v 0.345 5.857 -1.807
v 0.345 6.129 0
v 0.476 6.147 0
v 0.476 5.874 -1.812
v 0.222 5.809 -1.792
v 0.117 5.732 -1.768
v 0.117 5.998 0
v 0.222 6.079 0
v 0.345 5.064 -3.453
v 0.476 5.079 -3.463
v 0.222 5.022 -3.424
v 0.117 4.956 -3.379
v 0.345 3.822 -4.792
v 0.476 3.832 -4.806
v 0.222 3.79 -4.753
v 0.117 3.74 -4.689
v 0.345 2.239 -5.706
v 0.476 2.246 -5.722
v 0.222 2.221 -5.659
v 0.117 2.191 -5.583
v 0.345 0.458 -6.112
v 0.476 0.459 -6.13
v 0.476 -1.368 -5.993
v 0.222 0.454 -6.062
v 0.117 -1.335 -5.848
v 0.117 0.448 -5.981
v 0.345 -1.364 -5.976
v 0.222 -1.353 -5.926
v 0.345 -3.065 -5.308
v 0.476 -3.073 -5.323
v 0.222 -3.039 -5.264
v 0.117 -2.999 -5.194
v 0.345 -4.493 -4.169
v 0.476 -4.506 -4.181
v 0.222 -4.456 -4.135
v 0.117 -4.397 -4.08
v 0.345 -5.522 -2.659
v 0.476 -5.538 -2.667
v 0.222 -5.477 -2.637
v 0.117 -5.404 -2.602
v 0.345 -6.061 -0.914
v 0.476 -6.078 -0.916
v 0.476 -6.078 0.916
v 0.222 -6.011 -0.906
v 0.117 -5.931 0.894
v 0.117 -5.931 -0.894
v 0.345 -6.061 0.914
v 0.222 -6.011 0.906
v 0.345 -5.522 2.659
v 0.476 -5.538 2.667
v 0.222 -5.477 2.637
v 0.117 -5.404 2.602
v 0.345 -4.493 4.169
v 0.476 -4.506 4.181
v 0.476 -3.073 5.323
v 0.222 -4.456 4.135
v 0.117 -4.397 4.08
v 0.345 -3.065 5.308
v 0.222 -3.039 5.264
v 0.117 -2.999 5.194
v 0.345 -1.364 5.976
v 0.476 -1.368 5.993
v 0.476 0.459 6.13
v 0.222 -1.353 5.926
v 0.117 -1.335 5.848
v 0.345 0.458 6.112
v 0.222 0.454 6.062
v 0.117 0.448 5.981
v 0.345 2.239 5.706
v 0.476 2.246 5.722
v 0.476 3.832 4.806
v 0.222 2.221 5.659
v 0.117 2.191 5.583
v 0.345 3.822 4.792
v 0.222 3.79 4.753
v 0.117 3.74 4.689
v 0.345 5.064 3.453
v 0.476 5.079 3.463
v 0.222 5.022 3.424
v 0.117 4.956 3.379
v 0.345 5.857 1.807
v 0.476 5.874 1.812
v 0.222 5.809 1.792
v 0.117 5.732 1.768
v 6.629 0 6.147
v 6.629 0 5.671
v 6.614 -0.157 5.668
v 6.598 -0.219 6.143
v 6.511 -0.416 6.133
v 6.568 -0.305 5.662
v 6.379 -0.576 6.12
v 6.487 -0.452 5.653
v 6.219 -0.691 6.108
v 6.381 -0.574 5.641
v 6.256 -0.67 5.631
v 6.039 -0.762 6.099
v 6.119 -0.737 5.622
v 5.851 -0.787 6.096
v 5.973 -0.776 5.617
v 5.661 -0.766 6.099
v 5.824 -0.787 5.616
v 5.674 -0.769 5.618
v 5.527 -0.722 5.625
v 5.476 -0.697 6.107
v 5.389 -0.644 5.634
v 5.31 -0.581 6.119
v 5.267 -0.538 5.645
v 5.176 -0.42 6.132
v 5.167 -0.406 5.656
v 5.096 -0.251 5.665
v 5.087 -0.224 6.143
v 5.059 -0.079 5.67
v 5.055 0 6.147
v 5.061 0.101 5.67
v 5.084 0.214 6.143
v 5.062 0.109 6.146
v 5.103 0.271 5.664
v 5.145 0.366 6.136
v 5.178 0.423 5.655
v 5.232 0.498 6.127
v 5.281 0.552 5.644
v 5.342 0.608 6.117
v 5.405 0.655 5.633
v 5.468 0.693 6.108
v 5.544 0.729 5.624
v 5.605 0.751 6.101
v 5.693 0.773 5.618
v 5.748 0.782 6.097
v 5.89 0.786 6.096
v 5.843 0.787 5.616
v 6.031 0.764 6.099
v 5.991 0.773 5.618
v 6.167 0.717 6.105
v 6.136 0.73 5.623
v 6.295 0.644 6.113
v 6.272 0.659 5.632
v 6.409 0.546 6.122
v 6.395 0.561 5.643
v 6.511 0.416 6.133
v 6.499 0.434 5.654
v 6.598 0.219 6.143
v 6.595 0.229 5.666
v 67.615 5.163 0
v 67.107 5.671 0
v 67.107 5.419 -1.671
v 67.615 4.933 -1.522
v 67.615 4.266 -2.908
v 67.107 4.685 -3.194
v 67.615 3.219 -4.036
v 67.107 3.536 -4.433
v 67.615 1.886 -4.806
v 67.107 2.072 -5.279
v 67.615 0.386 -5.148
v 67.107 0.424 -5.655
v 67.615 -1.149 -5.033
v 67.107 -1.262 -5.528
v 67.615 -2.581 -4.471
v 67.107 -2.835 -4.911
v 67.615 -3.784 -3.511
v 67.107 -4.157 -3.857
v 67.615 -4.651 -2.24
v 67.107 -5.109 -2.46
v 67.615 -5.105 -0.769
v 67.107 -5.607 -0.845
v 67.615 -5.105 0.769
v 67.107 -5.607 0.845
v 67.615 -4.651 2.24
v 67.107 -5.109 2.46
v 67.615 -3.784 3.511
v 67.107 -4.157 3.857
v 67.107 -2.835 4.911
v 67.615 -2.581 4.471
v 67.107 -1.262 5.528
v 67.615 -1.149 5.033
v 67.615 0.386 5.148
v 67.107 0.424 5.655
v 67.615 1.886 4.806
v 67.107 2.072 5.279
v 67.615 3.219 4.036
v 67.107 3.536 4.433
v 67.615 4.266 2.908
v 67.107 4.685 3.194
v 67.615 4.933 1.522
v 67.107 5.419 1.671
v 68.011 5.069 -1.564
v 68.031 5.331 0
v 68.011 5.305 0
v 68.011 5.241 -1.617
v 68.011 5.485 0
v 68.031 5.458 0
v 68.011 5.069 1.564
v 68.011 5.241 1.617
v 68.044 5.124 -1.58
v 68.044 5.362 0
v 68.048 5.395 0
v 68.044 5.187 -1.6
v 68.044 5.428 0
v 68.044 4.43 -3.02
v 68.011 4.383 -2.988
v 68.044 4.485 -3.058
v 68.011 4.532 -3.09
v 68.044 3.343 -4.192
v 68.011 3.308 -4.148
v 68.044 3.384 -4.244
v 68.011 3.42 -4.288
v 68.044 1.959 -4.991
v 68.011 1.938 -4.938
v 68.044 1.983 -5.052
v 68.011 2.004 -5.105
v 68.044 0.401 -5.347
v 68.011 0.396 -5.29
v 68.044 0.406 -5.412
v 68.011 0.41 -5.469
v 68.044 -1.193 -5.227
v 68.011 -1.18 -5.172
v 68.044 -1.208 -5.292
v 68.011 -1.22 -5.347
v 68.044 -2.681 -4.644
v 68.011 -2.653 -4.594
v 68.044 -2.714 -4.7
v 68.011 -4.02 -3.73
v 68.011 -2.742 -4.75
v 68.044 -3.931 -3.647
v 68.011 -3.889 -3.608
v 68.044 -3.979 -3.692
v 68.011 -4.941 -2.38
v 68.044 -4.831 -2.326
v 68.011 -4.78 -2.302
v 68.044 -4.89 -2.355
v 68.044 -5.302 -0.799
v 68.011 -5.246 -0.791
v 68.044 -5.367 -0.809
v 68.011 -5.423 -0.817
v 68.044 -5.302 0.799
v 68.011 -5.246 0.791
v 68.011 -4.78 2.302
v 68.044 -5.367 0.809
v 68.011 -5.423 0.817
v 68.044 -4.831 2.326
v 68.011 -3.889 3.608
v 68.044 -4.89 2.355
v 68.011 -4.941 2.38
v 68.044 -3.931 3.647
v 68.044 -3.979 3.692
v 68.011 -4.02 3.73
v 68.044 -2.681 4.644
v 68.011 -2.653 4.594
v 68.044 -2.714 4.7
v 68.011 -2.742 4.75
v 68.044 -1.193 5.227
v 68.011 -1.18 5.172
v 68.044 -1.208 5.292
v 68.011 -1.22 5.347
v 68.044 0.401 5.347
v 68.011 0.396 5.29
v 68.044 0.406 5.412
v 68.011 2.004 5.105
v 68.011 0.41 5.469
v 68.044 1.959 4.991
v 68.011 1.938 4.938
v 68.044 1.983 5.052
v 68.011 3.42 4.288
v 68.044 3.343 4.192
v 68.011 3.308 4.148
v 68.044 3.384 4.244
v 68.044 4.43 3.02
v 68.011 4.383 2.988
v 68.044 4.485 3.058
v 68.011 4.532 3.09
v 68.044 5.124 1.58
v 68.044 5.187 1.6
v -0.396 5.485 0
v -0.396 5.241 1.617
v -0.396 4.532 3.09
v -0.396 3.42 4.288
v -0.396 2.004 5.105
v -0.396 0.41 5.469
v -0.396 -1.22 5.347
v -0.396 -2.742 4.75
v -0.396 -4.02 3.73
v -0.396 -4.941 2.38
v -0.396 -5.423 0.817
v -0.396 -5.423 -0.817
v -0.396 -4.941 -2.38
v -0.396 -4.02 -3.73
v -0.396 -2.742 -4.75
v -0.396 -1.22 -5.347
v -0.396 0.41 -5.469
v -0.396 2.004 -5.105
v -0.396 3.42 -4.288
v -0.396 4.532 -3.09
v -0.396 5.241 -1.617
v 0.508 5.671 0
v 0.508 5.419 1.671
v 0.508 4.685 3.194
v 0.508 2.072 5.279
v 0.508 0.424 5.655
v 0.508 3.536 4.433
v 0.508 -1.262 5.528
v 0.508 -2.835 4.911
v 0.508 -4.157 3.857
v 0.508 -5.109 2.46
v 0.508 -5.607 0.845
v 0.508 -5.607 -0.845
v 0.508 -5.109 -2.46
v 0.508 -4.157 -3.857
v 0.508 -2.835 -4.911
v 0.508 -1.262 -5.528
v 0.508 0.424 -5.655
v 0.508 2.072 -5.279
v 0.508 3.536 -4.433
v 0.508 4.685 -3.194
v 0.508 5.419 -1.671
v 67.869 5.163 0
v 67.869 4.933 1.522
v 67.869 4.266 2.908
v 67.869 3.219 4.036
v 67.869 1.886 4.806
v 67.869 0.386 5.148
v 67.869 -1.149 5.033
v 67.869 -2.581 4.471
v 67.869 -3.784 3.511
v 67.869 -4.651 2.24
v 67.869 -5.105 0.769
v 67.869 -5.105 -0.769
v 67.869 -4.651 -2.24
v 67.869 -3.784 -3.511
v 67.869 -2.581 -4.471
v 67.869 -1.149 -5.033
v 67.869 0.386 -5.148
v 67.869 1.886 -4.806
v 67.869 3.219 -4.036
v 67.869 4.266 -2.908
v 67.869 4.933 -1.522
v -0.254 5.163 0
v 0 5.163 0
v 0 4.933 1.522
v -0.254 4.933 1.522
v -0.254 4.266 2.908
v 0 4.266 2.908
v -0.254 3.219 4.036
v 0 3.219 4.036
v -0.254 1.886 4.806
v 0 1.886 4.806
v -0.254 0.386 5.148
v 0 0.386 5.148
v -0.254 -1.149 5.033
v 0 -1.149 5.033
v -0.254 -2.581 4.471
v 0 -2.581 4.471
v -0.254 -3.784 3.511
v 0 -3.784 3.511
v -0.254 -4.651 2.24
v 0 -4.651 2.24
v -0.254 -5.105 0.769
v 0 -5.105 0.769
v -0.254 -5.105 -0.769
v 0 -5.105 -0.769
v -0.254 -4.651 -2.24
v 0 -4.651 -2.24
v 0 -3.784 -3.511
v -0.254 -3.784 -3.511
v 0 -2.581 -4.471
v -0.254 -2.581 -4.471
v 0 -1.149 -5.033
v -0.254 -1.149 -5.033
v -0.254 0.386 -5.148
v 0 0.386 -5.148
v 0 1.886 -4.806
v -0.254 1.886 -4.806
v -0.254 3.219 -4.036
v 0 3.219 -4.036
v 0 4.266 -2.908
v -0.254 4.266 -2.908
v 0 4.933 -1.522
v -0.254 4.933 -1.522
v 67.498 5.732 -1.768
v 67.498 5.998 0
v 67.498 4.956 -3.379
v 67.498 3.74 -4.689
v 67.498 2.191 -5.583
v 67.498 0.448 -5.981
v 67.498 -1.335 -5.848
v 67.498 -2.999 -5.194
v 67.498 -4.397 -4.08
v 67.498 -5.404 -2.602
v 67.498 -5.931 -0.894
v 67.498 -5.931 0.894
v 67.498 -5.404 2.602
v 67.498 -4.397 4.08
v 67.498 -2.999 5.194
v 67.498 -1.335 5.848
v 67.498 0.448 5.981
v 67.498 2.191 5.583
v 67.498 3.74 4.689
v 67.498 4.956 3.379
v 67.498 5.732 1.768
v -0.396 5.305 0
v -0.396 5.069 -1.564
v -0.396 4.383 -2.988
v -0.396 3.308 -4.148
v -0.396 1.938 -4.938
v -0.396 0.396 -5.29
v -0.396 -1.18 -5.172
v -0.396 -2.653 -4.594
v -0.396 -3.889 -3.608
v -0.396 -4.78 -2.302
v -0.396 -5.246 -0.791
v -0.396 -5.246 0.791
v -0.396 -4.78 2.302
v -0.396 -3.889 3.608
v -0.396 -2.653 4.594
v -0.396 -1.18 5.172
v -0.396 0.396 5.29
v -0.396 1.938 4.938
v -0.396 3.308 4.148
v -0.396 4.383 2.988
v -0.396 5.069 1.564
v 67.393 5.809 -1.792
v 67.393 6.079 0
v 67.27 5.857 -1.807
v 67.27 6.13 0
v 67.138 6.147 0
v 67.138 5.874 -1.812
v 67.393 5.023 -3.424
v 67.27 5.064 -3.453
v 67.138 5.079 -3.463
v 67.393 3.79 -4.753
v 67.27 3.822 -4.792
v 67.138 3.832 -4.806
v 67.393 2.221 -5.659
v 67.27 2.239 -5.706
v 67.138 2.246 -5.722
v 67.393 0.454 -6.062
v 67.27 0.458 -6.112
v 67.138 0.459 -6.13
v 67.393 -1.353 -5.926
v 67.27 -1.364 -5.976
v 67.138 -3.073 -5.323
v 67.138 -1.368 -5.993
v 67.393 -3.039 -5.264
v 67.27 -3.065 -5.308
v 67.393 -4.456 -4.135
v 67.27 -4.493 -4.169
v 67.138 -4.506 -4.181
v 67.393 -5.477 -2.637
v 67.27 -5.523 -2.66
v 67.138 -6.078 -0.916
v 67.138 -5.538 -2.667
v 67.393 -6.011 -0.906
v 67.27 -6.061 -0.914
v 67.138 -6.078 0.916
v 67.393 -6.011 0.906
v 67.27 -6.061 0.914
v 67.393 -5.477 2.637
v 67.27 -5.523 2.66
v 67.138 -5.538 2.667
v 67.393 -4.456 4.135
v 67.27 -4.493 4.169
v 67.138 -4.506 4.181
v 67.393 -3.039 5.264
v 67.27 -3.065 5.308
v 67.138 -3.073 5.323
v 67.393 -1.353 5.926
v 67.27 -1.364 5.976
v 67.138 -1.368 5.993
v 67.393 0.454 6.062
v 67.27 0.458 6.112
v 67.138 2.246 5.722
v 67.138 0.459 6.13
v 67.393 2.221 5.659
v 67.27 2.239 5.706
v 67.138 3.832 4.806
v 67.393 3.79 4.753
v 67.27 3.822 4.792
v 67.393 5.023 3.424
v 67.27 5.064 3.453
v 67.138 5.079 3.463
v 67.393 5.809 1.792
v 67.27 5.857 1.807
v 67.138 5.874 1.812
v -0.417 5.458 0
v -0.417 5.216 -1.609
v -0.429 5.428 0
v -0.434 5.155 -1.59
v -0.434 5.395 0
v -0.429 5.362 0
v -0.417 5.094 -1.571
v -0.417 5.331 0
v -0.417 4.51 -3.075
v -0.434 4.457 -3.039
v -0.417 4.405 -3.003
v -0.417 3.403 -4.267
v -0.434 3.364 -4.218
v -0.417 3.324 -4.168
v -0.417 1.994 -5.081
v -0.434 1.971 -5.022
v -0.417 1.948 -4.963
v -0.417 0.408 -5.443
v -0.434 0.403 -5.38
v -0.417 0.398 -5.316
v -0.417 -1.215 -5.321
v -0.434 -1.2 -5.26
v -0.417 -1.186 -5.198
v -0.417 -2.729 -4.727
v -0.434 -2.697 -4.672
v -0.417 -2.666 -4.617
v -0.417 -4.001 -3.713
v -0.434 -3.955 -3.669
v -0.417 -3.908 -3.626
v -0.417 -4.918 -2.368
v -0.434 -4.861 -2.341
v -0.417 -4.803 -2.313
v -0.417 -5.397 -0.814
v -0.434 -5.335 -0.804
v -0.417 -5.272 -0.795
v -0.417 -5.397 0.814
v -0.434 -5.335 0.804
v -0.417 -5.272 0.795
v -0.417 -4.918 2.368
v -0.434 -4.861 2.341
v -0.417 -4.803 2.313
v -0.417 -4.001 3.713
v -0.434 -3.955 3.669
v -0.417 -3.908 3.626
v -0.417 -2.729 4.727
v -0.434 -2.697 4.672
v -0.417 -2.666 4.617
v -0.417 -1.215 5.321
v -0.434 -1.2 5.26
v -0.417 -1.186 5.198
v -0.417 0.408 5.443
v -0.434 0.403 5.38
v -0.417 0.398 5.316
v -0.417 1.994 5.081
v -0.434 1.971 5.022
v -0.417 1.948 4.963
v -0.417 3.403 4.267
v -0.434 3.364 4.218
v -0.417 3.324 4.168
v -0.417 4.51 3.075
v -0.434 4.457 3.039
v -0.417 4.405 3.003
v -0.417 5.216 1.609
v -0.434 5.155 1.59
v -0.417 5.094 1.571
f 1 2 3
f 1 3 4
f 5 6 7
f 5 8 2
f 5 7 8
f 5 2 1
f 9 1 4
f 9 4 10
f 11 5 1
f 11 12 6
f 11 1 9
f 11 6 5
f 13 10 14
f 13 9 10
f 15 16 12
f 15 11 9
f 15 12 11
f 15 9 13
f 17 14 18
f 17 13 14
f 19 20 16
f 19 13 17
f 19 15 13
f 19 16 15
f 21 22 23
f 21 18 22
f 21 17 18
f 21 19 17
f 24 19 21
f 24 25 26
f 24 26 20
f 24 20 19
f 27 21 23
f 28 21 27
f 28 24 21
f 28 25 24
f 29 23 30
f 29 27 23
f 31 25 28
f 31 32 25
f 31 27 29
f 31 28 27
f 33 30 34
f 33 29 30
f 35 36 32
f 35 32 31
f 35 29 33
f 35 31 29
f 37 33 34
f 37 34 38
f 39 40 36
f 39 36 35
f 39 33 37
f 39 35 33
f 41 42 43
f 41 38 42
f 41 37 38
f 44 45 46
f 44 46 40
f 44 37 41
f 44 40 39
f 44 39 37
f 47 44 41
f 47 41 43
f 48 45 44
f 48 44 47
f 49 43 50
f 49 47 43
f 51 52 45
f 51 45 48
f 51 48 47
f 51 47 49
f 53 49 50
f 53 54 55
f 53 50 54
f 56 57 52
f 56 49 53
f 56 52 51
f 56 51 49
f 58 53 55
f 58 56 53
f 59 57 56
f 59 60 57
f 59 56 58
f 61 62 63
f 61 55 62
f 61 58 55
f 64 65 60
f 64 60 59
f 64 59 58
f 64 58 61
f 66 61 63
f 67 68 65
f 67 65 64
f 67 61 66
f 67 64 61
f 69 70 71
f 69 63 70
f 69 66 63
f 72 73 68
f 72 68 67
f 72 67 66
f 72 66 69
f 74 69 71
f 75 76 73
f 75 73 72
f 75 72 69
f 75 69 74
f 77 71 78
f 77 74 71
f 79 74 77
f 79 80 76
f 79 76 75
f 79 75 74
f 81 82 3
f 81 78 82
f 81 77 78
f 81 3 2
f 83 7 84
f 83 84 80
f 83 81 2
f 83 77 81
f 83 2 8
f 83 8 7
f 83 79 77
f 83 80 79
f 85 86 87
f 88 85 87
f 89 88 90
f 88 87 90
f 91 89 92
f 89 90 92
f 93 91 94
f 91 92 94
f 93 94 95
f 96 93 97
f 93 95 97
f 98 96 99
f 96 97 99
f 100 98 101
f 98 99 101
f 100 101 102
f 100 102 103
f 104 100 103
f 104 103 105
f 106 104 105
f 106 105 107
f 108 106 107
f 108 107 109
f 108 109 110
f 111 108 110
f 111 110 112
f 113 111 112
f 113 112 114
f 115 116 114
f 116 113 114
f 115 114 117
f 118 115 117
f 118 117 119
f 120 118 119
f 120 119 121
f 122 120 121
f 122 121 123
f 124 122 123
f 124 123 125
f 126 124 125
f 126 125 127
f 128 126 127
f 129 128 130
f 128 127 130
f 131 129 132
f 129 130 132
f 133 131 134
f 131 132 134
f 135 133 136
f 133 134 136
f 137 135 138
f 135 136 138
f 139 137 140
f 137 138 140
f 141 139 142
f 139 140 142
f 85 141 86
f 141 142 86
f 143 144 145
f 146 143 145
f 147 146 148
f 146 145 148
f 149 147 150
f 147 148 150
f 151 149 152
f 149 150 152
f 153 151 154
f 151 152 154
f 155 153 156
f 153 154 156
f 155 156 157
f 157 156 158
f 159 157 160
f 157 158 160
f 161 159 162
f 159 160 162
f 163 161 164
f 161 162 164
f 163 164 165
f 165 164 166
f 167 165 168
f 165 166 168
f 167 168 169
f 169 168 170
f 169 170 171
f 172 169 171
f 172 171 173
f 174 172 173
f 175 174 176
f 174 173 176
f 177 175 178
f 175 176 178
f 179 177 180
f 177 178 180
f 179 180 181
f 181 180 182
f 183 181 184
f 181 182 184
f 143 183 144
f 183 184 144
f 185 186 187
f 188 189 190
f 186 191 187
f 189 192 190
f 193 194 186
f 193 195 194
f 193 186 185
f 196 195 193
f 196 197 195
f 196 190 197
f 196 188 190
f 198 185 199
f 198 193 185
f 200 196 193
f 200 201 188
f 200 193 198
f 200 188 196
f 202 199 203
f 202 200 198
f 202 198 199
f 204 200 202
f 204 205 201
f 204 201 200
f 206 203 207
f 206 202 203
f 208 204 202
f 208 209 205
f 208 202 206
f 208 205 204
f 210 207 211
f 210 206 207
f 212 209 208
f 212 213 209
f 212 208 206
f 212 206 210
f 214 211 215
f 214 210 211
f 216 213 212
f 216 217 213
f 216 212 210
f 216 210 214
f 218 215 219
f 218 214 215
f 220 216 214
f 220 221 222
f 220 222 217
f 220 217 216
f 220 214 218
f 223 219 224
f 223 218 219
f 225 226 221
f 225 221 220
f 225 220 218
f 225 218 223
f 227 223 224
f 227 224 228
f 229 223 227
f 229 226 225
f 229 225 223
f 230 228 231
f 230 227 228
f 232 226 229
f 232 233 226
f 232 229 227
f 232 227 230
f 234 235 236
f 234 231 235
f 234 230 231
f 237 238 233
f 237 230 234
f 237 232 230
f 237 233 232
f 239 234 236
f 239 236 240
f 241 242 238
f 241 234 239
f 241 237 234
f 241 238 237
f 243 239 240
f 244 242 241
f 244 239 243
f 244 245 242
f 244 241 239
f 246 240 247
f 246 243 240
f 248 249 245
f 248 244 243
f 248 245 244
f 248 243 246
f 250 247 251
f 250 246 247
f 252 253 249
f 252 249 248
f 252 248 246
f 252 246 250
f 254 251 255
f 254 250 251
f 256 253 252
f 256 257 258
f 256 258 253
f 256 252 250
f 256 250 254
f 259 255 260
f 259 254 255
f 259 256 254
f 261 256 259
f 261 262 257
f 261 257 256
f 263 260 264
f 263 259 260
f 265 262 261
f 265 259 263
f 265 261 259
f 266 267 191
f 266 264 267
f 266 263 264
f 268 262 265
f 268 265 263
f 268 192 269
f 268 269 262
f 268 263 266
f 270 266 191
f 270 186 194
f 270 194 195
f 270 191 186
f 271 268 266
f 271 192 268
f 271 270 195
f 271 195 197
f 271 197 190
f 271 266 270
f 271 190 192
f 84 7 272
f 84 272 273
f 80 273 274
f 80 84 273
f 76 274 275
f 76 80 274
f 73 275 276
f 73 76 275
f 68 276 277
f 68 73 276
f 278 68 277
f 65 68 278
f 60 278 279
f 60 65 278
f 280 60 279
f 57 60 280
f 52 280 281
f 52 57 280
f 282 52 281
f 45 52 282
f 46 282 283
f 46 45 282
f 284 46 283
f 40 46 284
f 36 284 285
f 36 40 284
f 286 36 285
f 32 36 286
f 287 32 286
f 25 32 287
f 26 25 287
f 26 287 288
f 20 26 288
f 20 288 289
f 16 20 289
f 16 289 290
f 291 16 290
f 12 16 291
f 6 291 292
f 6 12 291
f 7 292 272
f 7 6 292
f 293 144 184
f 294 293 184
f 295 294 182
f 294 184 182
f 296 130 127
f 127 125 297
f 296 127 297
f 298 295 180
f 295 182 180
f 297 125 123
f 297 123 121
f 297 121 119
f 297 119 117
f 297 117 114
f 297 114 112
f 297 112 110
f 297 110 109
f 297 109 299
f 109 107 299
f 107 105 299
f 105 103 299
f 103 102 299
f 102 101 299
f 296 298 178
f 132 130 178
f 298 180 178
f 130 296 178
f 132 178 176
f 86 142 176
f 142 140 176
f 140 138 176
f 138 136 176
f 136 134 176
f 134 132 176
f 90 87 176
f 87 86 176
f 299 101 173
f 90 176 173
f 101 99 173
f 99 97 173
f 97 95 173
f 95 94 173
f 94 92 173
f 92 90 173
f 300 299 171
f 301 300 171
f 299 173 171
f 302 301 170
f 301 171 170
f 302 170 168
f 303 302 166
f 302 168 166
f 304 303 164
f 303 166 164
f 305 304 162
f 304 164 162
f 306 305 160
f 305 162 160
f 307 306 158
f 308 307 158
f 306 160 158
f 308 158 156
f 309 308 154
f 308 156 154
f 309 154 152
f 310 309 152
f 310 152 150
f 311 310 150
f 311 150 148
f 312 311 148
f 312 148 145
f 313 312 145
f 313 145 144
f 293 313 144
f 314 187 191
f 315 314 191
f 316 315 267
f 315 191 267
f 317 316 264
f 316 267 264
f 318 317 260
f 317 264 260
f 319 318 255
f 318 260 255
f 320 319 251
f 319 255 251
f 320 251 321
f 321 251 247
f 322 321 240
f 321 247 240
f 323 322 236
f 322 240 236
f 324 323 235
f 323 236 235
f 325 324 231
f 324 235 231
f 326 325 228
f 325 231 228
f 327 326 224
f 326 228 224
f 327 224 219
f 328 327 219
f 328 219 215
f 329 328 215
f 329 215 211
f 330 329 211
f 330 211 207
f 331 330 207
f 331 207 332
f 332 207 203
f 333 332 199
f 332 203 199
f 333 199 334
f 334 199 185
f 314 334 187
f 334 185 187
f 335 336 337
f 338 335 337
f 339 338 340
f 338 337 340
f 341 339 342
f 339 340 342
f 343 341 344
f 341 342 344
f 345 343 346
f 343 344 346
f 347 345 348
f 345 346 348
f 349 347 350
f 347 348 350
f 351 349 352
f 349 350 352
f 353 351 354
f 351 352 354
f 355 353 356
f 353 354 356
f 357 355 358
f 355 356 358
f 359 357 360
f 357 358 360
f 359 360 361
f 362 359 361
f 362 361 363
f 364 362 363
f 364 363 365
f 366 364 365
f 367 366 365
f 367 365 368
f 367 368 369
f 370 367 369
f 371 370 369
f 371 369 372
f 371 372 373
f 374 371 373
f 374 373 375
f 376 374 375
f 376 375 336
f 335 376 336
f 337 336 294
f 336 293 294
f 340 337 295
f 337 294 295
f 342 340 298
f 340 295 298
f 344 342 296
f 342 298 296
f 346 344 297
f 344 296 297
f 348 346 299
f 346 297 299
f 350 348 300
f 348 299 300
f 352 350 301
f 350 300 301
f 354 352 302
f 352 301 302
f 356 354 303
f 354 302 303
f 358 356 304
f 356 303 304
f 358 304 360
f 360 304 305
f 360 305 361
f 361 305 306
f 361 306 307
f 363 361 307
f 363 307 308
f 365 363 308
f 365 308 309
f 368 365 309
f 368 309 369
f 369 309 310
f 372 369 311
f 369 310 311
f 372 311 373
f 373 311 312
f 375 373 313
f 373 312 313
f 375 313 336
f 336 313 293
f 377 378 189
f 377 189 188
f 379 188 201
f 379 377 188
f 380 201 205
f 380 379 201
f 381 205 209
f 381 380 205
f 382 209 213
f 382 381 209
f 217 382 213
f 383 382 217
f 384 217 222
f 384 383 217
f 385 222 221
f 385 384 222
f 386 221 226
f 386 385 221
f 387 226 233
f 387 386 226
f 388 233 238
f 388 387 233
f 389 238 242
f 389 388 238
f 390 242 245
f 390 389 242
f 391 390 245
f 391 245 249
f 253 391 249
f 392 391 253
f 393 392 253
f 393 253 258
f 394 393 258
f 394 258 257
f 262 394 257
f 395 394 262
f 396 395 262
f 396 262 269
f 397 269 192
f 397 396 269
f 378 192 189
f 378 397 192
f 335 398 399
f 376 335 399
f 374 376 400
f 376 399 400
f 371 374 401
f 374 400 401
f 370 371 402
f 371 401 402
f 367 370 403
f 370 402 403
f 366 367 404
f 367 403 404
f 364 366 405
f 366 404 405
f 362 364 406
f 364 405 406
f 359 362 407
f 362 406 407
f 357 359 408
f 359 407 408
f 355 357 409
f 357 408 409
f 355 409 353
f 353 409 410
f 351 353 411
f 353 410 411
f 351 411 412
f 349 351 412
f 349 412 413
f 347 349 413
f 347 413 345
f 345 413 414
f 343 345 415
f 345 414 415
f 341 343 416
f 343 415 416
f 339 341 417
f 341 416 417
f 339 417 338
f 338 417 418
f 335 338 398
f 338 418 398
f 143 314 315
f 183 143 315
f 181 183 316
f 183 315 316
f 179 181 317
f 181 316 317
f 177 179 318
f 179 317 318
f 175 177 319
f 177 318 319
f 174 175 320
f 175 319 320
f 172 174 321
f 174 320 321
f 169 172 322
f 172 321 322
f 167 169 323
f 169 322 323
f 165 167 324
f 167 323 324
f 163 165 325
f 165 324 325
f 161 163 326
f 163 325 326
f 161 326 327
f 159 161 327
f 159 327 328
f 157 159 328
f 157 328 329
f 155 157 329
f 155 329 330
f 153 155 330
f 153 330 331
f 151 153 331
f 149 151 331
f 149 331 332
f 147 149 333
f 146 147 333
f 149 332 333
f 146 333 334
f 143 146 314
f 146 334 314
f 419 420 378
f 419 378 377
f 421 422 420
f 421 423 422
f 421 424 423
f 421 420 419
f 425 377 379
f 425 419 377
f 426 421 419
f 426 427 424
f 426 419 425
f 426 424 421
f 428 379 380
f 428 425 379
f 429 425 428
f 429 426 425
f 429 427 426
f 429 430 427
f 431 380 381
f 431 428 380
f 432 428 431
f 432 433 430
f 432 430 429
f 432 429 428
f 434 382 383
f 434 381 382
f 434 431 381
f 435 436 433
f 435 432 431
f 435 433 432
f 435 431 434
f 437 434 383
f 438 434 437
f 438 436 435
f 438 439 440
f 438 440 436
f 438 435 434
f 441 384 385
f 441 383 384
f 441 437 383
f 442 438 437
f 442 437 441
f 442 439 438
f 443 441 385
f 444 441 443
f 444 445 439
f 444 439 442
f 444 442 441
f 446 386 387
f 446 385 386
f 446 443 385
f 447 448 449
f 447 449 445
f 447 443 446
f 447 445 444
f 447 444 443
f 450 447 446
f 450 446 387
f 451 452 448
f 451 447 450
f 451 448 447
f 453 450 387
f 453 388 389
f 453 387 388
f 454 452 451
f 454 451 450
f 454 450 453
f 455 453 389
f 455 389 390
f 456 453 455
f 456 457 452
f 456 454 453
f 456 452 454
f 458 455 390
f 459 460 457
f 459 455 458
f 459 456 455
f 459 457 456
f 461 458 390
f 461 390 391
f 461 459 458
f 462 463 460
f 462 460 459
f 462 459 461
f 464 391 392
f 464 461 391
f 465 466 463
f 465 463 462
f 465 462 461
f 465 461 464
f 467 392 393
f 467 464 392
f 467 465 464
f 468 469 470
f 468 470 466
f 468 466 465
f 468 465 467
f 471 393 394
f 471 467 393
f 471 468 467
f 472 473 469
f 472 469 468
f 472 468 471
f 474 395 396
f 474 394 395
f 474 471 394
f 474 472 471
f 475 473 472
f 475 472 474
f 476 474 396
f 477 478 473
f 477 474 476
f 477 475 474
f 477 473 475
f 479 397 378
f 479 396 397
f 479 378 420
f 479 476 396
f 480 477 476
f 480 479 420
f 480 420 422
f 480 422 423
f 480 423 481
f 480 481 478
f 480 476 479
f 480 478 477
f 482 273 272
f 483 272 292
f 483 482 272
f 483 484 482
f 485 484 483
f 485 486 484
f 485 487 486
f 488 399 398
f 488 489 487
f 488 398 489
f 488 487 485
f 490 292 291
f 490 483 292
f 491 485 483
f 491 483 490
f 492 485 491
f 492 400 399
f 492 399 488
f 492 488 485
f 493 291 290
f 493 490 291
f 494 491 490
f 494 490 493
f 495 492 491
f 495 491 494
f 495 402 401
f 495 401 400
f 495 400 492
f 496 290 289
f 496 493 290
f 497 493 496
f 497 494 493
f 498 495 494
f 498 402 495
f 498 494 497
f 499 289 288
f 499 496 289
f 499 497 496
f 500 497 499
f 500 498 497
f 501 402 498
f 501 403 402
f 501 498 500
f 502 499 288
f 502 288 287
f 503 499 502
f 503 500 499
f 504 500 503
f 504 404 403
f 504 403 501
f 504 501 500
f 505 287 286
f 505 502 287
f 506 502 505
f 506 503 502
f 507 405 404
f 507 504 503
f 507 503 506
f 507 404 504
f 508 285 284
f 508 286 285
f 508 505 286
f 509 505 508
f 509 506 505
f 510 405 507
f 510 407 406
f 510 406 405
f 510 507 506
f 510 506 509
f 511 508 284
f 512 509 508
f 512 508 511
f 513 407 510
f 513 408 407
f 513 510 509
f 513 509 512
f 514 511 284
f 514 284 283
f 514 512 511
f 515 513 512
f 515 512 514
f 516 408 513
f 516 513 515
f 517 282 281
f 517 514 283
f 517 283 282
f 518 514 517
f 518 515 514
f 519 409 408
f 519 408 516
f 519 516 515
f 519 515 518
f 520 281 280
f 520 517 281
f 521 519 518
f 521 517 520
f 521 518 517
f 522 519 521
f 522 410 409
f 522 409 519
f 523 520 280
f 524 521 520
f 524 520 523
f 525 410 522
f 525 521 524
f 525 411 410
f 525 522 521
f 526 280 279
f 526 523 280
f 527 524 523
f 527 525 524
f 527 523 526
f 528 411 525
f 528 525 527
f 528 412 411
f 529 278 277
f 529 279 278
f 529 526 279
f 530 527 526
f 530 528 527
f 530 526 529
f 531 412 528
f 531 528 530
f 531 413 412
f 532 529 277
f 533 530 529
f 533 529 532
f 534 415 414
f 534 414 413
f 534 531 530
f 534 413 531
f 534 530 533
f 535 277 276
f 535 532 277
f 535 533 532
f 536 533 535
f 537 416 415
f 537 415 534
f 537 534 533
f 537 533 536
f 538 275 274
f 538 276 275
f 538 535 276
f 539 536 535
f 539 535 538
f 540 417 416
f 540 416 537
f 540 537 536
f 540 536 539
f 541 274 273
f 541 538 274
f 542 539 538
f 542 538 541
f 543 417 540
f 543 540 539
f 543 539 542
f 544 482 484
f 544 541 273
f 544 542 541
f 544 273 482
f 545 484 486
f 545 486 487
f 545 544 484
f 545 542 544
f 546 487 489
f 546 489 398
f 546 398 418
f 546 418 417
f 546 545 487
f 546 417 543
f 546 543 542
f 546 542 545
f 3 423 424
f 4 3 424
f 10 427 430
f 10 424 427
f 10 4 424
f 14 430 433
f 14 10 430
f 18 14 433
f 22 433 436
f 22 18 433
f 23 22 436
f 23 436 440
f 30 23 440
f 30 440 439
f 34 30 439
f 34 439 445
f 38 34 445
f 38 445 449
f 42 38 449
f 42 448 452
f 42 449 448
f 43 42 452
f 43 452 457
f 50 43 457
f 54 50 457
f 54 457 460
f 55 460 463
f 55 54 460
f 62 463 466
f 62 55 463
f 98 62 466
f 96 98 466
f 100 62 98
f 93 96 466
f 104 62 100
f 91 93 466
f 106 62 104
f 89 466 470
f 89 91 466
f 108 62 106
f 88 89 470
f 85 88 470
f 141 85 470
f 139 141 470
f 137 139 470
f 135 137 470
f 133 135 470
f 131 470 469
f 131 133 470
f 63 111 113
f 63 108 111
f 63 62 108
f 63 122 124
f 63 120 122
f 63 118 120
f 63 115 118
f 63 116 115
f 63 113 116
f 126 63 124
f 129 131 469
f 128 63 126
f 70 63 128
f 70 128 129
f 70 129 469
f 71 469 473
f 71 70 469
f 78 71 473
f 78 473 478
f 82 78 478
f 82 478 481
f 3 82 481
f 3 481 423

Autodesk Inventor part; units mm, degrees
sketch "Sketch_1" plane through (0, 0, 0) normal (0, 0, 1) x (1, 0, 0)
  line L0 (67.6148, 0) -> (0, 0)
  arc A0 (-0.3964, 5.4846) -> (-0.3964, 5.305) centre (-0.3066, 5.3948) ccw
  line L1 (-0.3964, 5.305) -> (-0.254, 5.1626)
  line L2 (-0.254, 5.1626) -> (0, 5.1626)
  line L3 (0, 5.1626) -> (0.508, 5.6706)
  line L4 (0.508, 5.6706) -> (67.1068, 5.6706)
  line L5 (67.1068, 5.6706) -> (67.6148, 5.1626)
  line L6 (67.6148, 5.1626) -> (67.8688, 5.1626)
  line L7 (67.8688, 5.1626) -> (68.0112, 5.305)
  arc A1 (68.0112, 5.305) -> (68.0112, 5.4846) centre (67.9214, 5.3948) ccw
  line L8 (68.0112, 5.4846) -> (67.4978, 5.998)
  arc A2 (67.4978, 5.998) -> (67.1385, 6.1468) centre (67.1385, 5.6388) ccw
  line L9 (67.1385, 6.1468) -> (0.4763, 6.1468)
  arc A3 (0.4763, 6.1468) -> (0.117, 5.998) centre (0.4763, 5.6388) ccw
  line L10 (0.117, 5.998) -> (-0.3964, 5.4846)
revolve "Revolution1" add sketch "Sketch_1" angle 360 about axis through (67.6148, 0, 0) along (1, 0, 0)
sketch "Sketch_4" plane through (0, 0, 0) normal (0, 0, 1) x (1, 0, 0)
  circle A0 centre (5.842, 0) radius 0.7874
extrude "Extrusion1" cut sketch "Sketch_4" along normal blind 6.1468
ref_plane "cp1_XY" through (33.8074, 6.1468, 0) normal (1, 0, 0) x (0, 0, -1)
ref_plane "cp1_YZ" through (33.8074, 6.1468, 0) normal (0, 0, -1) x (0, 1, 0)
ref_plane "cp1_ZX" through (33.8074, 6.1468, 0) normal (0, 1, 0) x (1, 0, 0)
ref_plane "cp2_XY" through (33.8074, 0, -6.1468) normal (1, 0, 0) x (0, 0, -1)
ref_plane "cp2_YZ" through (33.8074, 0, -6.1468) normal (0, 0, -1) x (0, 1, 0)
ref_plane "cp2_ZX" through (33.8074, 0, -6.1468) normal (0, 1, 0) x (1, 0, 0)
ref_plane "cp3_XY" through (33.8074, -6.1468, 0) normal (1, 0, 0) x (0, 0, -1)
ref_plane "cp3_YZ" through (33.8074, -6.1468, 0) normal (0, 0, -1) x (0, 1, 0)
ref_plane "cp3_ZX" through (33.8074, -6.1468, 0) normal (0, 1, 0) x (1, 0, 0)
ref_plane "cp4_XY" through (33.8074, 0, 6.1468) normal (1, 0, 0) x (0, 0, -1)
ref_plane "cp4_YZ" through (33.8074, 0, 6.1468) normal (0, 0, -1) x (0, 1, 0)
ref_plane "cp4_ZX" through (33.8074, 0, 6.1468) normal (0, 1, 0) x (1, 0, 0)
ref_plane "tube_front_XY" through (0, 0, 0) normal (1, 0, 0) x (0, 0, -1)
ref_plane "tube_front_YZ" through (0, 0, 0) normal (0, 0, -1) x (0, 1, 0)
ref_plane "tube_front_ZX" through (0, 0, 0) normal (0, 1, 0) x (1, 0, 0)
ref_plane "tube_rear_XY" through (67.6148, 0, 0) normal (1, 0, 0) x (0, 0, -1)
ref_plane "tube_rear_YZ" through (67.6148, 0, 0) normal (0, 0, -1) x (0, 1, 0)
ref_plane "tube_rear_ZX" through (67.6148, 0, 0) normal (0, 1, 0) x (1, 0, 0)
properties part number "01-2.6622"
